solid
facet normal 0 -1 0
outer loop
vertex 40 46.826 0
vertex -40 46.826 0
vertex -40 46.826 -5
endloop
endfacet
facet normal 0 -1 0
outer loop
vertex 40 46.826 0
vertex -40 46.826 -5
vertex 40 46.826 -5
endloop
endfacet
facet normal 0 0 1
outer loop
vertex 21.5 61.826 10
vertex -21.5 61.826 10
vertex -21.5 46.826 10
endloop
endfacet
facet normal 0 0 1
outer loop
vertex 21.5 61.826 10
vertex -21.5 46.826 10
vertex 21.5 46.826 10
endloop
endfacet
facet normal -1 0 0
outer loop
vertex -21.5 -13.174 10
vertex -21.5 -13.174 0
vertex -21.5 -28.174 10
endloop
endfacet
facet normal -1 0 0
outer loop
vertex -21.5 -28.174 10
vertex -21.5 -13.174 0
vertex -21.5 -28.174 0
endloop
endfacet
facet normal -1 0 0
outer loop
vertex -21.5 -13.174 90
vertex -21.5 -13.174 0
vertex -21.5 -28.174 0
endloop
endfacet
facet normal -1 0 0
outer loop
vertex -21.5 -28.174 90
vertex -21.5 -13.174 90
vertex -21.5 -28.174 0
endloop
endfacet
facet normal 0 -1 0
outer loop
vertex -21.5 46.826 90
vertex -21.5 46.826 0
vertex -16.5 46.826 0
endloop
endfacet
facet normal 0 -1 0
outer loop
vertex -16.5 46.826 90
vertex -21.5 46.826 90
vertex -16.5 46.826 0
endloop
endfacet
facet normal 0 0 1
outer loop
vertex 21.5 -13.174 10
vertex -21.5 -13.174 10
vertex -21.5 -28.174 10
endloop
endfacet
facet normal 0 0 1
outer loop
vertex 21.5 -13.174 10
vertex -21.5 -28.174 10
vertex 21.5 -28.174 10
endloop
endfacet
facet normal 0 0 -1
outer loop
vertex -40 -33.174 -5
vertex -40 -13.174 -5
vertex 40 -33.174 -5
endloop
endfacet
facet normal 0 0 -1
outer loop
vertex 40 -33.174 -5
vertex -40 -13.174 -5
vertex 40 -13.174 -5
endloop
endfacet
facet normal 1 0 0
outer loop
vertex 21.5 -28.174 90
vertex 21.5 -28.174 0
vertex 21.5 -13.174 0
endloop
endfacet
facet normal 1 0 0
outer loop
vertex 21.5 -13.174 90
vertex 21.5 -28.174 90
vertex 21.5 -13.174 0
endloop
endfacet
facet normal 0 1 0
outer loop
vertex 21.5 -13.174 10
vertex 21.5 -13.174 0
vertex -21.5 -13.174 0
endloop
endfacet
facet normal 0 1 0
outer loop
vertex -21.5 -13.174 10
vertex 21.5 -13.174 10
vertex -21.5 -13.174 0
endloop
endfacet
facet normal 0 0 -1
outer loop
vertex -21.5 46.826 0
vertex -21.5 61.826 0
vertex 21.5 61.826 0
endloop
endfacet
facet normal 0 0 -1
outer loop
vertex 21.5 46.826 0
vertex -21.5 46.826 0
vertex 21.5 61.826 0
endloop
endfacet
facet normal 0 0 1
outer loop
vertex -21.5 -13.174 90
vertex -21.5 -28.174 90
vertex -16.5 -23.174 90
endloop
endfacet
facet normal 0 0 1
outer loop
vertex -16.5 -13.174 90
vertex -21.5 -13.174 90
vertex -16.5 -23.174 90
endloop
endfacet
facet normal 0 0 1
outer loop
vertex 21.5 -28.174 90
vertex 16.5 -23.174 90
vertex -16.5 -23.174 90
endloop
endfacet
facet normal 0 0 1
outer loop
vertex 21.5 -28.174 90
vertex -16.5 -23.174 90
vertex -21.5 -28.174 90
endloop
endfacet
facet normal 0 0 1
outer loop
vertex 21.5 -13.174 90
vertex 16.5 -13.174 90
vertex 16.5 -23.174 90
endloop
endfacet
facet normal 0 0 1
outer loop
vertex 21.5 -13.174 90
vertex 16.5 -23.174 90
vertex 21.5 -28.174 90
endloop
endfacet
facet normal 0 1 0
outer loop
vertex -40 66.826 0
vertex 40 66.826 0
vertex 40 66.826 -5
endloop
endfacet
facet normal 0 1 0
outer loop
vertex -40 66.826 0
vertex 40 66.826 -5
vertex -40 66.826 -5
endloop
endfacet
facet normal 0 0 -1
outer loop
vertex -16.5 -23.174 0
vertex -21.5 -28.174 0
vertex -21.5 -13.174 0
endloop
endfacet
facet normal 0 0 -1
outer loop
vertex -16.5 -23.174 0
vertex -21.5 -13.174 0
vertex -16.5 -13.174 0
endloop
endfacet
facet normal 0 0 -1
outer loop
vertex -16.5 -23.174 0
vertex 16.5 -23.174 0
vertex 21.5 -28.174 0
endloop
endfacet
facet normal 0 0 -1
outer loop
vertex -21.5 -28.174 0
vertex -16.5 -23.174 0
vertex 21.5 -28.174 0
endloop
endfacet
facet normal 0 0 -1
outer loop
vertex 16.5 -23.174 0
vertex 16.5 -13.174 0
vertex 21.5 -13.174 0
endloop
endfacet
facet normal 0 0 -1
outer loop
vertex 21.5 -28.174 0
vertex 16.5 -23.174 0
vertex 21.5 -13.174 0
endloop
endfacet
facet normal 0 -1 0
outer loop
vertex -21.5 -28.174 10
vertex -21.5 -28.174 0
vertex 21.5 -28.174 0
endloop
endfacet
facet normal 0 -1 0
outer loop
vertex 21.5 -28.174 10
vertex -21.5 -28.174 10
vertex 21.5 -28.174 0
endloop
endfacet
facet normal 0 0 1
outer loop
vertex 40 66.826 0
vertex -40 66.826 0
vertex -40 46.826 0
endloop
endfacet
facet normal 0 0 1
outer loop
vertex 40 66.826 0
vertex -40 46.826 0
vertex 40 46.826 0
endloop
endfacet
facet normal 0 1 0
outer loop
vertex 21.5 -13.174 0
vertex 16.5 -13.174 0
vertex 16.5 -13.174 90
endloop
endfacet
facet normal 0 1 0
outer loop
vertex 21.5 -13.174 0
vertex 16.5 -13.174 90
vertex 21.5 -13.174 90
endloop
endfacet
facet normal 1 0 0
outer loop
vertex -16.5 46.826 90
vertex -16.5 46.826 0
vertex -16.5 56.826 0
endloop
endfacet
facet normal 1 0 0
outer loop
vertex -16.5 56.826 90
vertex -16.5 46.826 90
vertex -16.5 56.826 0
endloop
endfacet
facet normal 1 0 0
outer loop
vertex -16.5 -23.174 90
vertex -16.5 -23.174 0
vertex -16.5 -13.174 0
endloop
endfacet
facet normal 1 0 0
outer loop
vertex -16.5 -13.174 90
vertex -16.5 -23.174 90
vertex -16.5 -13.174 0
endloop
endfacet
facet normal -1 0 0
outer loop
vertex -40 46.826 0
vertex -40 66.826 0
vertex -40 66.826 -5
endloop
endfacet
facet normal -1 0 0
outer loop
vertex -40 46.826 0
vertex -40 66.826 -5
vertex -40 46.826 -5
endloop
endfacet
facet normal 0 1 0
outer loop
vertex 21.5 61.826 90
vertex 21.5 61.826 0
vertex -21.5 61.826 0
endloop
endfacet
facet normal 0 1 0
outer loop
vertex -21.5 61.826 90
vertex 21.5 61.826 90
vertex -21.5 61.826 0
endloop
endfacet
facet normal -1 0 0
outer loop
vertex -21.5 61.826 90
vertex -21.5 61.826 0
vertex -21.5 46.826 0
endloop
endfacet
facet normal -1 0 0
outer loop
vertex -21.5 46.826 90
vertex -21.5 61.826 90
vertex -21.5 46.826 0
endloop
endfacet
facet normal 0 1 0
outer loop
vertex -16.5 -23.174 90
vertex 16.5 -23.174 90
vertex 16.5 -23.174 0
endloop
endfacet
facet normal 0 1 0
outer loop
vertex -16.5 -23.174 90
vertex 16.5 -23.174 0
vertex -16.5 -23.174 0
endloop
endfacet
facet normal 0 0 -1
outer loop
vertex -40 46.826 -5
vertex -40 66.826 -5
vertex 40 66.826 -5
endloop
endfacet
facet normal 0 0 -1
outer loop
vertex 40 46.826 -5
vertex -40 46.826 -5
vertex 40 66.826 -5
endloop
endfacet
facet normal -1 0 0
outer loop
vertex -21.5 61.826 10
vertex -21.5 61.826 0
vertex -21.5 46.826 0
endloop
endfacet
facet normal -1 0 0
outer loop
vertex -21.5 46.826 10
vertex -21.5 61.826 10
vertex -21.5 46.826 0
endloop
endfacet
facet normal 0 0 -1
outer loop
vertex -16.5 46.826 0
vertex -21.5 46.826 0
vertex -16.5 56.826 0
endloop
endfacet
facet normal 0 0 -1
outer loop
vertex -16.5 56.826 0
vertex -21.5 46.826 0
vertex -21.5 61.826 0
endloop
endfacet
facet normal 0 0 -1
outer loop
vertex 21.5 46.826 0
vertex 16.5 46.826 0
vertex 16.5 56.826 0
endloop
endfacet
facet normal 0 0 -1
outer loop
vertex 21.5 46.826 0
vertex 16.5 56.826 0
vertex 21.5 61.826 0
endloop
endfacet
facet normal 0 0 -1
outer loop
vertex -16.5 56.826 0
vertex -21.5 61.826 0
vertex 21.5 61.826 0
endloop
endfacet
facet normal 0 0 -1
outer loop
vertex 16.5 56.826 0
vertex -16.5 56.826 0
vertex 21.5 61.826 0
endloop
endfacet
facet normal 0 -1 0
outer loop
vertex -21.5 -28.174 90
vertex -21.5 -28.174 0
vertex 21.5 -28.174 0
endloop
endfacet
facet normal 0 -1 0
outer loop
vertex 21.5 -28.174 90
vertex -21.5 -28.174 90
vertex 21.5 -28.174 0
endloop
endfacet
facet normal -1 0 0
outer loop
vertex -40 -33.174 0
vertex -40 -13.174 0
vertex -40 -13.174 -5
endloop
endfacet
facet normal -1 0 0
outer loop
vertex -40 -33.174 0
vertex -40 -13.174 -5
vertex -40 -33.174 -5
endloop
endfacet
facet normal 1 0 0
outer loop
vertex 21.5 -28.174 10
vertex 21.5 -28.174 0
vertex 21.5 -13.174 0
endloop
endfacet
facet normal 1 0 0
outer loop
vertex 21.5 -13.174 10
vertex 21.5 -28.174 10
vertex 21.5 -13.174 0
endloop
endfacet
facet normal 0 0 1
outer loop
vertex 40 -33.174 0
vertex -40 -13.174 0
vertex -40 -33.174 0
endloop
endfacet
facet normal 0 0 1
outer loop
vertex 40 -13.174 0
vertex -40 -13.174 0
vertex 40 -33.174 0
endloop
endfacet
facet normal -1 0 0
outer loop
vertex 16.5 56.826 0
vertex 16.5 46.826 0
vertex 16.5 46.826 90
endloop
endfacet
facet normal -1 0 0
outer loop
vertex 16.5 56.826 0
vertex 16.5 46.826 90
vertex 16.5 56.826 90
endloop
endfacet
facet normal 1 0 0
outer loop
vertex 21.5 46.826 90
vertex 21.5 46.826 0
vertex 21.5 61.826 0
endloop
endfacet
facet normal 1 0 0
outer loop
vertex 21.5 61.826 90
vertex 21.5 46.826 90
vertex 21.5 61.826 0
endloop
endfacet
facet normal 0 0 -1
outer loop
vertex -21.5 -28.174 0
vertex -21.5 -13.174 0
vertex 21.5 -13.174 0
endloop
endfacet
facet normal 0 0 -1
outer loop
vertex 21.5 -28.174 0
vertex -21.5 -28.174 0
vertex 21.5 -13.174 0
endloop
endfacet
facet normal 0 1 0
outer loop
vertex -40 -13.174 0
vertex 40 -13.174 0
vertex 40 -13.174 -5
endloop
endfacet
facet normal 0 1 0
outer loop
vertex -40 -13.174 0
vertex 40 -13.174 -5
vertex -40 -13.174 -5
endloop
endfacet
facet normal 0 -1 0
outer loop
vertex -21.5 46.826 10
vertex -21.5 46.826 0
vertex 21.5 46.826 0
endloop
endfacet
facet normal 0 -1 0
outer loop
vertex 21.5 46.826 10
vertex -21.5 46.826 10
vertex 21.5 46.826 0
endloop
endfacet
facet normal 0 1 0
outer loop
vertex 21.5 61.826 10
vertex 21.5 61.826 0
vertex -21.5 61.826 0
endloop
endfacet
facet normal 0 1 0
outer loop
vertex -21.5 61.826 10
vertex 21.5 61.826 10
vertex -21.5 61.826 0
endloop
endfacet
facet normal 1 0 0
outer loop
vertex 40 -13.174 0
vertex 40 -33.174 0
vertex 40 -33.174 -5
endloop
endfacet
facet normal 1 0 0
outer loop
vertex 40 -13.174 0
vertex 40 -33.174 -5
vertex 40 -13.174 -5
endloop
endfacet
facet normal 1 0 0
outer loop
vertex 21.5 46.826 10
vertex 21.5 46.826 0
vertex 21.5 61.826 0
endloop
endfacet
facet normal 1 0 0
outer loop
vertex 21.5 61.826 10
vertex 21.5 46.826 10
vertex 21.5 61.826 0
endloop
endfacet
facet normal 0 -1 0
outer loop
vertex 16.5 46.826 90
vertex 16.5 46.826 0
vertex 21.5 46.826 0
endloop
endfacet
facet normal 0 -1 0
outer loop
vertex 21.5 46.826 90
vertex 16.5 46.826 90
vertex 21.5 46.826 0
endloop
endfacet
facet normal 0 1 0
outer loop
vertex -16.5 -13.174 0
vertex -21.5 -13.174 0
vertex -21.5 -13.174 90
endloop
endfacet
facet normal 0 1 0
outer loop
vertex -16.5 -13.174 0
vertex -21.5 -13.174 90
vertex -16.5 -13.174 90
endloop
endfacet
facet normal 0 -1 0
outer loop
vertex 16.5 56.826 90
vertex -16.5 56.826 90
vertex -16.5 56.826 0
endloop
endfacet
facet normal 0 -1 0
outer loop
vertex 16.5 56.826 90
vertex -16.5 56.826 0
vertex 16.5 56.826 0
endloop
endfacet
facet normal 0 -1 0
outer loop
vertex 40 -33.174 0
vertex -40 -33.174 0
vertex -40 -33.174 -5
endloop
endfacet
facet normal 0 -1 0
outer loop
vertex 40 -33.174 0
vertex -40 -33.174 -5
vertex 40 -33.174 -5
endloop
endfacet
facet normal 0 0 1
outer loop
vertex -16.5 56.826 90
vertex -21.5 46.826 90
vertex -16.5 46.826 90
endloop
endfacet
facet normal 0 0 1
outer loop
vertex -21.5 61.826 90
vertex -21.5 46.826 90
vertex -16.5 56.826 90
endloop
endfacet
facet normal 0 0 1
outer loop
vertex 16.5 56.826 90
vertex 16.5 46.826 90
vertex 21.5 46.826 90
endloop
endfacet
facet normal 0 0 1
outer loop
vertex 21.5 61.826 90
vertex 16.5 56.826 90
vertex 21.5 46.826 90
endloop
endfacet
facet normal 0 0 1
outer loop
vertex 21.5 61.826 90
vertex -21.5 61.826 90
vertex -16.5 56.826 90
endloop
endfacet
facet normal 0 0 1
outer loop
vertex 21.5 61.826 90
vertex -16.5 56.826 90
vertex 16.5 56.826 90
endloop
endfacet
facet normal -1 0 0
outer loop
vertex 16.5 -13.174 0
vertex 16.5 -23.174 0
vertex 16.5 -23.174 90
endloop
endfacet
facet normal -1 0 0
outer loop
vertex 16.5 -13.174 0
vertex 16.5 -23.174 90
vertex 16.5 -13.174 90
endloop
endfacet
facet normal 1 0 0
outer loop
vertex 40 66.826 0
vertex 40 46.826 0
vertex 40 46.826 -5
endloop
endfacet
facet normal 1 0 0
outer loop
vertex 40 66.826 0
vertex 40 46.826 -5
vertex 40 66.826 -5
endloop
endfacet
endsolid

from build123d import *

# Parameters (mm, degrees)
F0_W     = 5
F0_H     = 10.0000009071
F0_W_2   = 33
F1_DEPTH = 5
F2_DEPTH = 10
F3_DEPTH = 90


with BuildPart() as f1:
    # F0 (on Top) → F1 (new body)
    with BuildSketch(Plane.XY):
        Polygon((-21.5000037253, -13.1741991769), (-40.0000037253, -13.1741991769), (-40.0000037253, -33.1742009911), (39.9999962747, -33.1742009911), (39.9999962747, -13.1741991769), (21.4999962747, -13.1741991769), (21.4999962747, -23.174200084), (21.4999962747, -28.174200084), (-21.5000037253, -28.174200084), (-21.5000037253, -23.174200084), align=None)
        with Locations((-19.0000037253, -18.1741996305)):
            Rectangle(F0_W, F0_H)
        with Locations((-3.7253e-06, -18.1741996305)):
            Rectangle(F0_W_2, F0_H)
        with Locations((18.9999962747, -18.1741996305)):
            Rectangle(F0_W, F0_H)
        Polygon((-16.5000037253, -23.174200084), (-21.5000037253, -23.174200084), (-21.5000037253, -28.174200084), (21.4999962747, -28.174200084), (21.4999962747, -23.174200084), (16.4999962747, -23.174200084), align=None)
    extrude(amount=-F1_DEPTH)


with BuildPart() as f1b:
    # F0 (on Top) → F1, piece 2 (new body)
    with BuildSketch(Plane.XY):
        Polygon((-40.0000037253, 66.8258026372), (-40.0000037253, 46.8258008231), (-21.5000037253, 46.8258008231), (-21.5000037253, 56.8258017302), (-21.5000037253, 61.8258017302), (21.4999962747, 61.8258017302), (21.4999962747, 56.8258017302), (21.4999962747, 46.8258008231), (39.9999962747, 46.8258008231), (39.9999962747, 66.8258026372), align=None)
        with Locations((-19.0000037253, 51.8258012766)):
            Rectangle(F0_W, F0_H)
        with Locations((-3.7253e-06, 51.8258012766)):
            Rectangle(F0_W_2, F0_H)
        with Locations((18.9999962747, 51.8258012766)):
            Rectangle(F0_W, F0_H)
        Polygon((-21.5000037253, 61.8258017302), (-21.5000037253, 56.8258017302), (-16.5000037253, 56.8258017302), (16.4999962747, 56.8258017302), (21.4999962747, 56.8258017302), (21.4999962747, 61.8258017302), align=None)
    extrude(amount=-F1_DEPTH)


with BuildPart() as f2:
    # F0 (on Top) → F2 (new body)
    with BuildSketch(Plane.XY):
        with Locations((-19.0000037253, -18.1741996305)):
            Rectangle(F0_W, F0_H)
        Polygon((-16.5000037253, -23.174200084), (-21.5000037253, -23.174200084), (-21.5000037253, -28.174200084), (21.4999962747, -28.174200084), (21.4999962747, -23.174200084), (16.4999962747, -23.174200084), align=None)
        with Locations((18.9999962747, -18.1741996305)):
            Rectangle(F0_W, F0_H)
        with Locations((-3.7253e-06, -18.1741996305)):
            Rectangle(F0_W_2, F0_H)
    extrude(amount=F2_DEPTH)


with BuildPart() as f2b:
    # F0 (on Top) → F2, piece 2 (new body)
    with BuildSketch(Plane.XY):
        with Locations((-19.0000037253, 51.8258012766)):
            Rectangle(F0_W, F0_H)
        Polygon((-21.5000037253, 61.8258017302), (-21.5000037253, 56.8258017302), (-16.5000037253, 56.8258017302), (16.4999962747, 56.8258017302), (21.4999962747, 56.8258017302), (21.4999962747, 61.8258017302), align=None)
        with Locations((18.9999962747, 51.8258012766)):
            Rectangle(F0_W, F0_H)
        with Locations((-3.7253e-06, 51.8258012766)):
            Rectangle(F0_W_2, F0_H)
    extrude(amount=F2_DEPTH)


with BuildPart() as f3:
    # F0 (on Top) → F3 (new body)
    with BuildSketch(Plane.XY):
        with Locations((18.9999962747, -18.1741996305)):
            Rectangle(F0_W, F0_H)
        Polygon((-16.5000037253, -23.174200084), (-21.5000037253, -23.174200084), (-21.5000037253, -28.174200084), (21.4999962747, -28.174200084), (21.4999962747, -23.174200084), (16.4999962747, -23.174200084), align=None)
        with Locations((-19.0000037253, -18.1741996305)):
            Rectangle(F0_W, F0_H)
    extrude(amount=F3_DEPTH)


with BuildPart() as f3b:
    # F0 (on Top) → F3, piece 2 (new body)
    with BuildSketch(Plane.XY):
        with Locations((18.9999962747, 51.8258012766)):
            Rectangle(F0_W, F0_H)
        Polygon((-21.5000037253, 61.8258017302), (-21.5000037253, 56.8258017302), (-16.5000037253, 56.8258017302), (16.4999962747, 56.8258017302), (21.4999962747, 56.8258017302), (21.4999962747, 61.8258017302), align=None)
        with Locations((-19.0000037253, 51.8258012766)):
            Rectangle(F0_W, F0_H)
    extrude(amount=F3_DEPTH)


solid = Compound([f1.part, f1b.part, f2.part, f2b.part, f3.part, f3b.part])
